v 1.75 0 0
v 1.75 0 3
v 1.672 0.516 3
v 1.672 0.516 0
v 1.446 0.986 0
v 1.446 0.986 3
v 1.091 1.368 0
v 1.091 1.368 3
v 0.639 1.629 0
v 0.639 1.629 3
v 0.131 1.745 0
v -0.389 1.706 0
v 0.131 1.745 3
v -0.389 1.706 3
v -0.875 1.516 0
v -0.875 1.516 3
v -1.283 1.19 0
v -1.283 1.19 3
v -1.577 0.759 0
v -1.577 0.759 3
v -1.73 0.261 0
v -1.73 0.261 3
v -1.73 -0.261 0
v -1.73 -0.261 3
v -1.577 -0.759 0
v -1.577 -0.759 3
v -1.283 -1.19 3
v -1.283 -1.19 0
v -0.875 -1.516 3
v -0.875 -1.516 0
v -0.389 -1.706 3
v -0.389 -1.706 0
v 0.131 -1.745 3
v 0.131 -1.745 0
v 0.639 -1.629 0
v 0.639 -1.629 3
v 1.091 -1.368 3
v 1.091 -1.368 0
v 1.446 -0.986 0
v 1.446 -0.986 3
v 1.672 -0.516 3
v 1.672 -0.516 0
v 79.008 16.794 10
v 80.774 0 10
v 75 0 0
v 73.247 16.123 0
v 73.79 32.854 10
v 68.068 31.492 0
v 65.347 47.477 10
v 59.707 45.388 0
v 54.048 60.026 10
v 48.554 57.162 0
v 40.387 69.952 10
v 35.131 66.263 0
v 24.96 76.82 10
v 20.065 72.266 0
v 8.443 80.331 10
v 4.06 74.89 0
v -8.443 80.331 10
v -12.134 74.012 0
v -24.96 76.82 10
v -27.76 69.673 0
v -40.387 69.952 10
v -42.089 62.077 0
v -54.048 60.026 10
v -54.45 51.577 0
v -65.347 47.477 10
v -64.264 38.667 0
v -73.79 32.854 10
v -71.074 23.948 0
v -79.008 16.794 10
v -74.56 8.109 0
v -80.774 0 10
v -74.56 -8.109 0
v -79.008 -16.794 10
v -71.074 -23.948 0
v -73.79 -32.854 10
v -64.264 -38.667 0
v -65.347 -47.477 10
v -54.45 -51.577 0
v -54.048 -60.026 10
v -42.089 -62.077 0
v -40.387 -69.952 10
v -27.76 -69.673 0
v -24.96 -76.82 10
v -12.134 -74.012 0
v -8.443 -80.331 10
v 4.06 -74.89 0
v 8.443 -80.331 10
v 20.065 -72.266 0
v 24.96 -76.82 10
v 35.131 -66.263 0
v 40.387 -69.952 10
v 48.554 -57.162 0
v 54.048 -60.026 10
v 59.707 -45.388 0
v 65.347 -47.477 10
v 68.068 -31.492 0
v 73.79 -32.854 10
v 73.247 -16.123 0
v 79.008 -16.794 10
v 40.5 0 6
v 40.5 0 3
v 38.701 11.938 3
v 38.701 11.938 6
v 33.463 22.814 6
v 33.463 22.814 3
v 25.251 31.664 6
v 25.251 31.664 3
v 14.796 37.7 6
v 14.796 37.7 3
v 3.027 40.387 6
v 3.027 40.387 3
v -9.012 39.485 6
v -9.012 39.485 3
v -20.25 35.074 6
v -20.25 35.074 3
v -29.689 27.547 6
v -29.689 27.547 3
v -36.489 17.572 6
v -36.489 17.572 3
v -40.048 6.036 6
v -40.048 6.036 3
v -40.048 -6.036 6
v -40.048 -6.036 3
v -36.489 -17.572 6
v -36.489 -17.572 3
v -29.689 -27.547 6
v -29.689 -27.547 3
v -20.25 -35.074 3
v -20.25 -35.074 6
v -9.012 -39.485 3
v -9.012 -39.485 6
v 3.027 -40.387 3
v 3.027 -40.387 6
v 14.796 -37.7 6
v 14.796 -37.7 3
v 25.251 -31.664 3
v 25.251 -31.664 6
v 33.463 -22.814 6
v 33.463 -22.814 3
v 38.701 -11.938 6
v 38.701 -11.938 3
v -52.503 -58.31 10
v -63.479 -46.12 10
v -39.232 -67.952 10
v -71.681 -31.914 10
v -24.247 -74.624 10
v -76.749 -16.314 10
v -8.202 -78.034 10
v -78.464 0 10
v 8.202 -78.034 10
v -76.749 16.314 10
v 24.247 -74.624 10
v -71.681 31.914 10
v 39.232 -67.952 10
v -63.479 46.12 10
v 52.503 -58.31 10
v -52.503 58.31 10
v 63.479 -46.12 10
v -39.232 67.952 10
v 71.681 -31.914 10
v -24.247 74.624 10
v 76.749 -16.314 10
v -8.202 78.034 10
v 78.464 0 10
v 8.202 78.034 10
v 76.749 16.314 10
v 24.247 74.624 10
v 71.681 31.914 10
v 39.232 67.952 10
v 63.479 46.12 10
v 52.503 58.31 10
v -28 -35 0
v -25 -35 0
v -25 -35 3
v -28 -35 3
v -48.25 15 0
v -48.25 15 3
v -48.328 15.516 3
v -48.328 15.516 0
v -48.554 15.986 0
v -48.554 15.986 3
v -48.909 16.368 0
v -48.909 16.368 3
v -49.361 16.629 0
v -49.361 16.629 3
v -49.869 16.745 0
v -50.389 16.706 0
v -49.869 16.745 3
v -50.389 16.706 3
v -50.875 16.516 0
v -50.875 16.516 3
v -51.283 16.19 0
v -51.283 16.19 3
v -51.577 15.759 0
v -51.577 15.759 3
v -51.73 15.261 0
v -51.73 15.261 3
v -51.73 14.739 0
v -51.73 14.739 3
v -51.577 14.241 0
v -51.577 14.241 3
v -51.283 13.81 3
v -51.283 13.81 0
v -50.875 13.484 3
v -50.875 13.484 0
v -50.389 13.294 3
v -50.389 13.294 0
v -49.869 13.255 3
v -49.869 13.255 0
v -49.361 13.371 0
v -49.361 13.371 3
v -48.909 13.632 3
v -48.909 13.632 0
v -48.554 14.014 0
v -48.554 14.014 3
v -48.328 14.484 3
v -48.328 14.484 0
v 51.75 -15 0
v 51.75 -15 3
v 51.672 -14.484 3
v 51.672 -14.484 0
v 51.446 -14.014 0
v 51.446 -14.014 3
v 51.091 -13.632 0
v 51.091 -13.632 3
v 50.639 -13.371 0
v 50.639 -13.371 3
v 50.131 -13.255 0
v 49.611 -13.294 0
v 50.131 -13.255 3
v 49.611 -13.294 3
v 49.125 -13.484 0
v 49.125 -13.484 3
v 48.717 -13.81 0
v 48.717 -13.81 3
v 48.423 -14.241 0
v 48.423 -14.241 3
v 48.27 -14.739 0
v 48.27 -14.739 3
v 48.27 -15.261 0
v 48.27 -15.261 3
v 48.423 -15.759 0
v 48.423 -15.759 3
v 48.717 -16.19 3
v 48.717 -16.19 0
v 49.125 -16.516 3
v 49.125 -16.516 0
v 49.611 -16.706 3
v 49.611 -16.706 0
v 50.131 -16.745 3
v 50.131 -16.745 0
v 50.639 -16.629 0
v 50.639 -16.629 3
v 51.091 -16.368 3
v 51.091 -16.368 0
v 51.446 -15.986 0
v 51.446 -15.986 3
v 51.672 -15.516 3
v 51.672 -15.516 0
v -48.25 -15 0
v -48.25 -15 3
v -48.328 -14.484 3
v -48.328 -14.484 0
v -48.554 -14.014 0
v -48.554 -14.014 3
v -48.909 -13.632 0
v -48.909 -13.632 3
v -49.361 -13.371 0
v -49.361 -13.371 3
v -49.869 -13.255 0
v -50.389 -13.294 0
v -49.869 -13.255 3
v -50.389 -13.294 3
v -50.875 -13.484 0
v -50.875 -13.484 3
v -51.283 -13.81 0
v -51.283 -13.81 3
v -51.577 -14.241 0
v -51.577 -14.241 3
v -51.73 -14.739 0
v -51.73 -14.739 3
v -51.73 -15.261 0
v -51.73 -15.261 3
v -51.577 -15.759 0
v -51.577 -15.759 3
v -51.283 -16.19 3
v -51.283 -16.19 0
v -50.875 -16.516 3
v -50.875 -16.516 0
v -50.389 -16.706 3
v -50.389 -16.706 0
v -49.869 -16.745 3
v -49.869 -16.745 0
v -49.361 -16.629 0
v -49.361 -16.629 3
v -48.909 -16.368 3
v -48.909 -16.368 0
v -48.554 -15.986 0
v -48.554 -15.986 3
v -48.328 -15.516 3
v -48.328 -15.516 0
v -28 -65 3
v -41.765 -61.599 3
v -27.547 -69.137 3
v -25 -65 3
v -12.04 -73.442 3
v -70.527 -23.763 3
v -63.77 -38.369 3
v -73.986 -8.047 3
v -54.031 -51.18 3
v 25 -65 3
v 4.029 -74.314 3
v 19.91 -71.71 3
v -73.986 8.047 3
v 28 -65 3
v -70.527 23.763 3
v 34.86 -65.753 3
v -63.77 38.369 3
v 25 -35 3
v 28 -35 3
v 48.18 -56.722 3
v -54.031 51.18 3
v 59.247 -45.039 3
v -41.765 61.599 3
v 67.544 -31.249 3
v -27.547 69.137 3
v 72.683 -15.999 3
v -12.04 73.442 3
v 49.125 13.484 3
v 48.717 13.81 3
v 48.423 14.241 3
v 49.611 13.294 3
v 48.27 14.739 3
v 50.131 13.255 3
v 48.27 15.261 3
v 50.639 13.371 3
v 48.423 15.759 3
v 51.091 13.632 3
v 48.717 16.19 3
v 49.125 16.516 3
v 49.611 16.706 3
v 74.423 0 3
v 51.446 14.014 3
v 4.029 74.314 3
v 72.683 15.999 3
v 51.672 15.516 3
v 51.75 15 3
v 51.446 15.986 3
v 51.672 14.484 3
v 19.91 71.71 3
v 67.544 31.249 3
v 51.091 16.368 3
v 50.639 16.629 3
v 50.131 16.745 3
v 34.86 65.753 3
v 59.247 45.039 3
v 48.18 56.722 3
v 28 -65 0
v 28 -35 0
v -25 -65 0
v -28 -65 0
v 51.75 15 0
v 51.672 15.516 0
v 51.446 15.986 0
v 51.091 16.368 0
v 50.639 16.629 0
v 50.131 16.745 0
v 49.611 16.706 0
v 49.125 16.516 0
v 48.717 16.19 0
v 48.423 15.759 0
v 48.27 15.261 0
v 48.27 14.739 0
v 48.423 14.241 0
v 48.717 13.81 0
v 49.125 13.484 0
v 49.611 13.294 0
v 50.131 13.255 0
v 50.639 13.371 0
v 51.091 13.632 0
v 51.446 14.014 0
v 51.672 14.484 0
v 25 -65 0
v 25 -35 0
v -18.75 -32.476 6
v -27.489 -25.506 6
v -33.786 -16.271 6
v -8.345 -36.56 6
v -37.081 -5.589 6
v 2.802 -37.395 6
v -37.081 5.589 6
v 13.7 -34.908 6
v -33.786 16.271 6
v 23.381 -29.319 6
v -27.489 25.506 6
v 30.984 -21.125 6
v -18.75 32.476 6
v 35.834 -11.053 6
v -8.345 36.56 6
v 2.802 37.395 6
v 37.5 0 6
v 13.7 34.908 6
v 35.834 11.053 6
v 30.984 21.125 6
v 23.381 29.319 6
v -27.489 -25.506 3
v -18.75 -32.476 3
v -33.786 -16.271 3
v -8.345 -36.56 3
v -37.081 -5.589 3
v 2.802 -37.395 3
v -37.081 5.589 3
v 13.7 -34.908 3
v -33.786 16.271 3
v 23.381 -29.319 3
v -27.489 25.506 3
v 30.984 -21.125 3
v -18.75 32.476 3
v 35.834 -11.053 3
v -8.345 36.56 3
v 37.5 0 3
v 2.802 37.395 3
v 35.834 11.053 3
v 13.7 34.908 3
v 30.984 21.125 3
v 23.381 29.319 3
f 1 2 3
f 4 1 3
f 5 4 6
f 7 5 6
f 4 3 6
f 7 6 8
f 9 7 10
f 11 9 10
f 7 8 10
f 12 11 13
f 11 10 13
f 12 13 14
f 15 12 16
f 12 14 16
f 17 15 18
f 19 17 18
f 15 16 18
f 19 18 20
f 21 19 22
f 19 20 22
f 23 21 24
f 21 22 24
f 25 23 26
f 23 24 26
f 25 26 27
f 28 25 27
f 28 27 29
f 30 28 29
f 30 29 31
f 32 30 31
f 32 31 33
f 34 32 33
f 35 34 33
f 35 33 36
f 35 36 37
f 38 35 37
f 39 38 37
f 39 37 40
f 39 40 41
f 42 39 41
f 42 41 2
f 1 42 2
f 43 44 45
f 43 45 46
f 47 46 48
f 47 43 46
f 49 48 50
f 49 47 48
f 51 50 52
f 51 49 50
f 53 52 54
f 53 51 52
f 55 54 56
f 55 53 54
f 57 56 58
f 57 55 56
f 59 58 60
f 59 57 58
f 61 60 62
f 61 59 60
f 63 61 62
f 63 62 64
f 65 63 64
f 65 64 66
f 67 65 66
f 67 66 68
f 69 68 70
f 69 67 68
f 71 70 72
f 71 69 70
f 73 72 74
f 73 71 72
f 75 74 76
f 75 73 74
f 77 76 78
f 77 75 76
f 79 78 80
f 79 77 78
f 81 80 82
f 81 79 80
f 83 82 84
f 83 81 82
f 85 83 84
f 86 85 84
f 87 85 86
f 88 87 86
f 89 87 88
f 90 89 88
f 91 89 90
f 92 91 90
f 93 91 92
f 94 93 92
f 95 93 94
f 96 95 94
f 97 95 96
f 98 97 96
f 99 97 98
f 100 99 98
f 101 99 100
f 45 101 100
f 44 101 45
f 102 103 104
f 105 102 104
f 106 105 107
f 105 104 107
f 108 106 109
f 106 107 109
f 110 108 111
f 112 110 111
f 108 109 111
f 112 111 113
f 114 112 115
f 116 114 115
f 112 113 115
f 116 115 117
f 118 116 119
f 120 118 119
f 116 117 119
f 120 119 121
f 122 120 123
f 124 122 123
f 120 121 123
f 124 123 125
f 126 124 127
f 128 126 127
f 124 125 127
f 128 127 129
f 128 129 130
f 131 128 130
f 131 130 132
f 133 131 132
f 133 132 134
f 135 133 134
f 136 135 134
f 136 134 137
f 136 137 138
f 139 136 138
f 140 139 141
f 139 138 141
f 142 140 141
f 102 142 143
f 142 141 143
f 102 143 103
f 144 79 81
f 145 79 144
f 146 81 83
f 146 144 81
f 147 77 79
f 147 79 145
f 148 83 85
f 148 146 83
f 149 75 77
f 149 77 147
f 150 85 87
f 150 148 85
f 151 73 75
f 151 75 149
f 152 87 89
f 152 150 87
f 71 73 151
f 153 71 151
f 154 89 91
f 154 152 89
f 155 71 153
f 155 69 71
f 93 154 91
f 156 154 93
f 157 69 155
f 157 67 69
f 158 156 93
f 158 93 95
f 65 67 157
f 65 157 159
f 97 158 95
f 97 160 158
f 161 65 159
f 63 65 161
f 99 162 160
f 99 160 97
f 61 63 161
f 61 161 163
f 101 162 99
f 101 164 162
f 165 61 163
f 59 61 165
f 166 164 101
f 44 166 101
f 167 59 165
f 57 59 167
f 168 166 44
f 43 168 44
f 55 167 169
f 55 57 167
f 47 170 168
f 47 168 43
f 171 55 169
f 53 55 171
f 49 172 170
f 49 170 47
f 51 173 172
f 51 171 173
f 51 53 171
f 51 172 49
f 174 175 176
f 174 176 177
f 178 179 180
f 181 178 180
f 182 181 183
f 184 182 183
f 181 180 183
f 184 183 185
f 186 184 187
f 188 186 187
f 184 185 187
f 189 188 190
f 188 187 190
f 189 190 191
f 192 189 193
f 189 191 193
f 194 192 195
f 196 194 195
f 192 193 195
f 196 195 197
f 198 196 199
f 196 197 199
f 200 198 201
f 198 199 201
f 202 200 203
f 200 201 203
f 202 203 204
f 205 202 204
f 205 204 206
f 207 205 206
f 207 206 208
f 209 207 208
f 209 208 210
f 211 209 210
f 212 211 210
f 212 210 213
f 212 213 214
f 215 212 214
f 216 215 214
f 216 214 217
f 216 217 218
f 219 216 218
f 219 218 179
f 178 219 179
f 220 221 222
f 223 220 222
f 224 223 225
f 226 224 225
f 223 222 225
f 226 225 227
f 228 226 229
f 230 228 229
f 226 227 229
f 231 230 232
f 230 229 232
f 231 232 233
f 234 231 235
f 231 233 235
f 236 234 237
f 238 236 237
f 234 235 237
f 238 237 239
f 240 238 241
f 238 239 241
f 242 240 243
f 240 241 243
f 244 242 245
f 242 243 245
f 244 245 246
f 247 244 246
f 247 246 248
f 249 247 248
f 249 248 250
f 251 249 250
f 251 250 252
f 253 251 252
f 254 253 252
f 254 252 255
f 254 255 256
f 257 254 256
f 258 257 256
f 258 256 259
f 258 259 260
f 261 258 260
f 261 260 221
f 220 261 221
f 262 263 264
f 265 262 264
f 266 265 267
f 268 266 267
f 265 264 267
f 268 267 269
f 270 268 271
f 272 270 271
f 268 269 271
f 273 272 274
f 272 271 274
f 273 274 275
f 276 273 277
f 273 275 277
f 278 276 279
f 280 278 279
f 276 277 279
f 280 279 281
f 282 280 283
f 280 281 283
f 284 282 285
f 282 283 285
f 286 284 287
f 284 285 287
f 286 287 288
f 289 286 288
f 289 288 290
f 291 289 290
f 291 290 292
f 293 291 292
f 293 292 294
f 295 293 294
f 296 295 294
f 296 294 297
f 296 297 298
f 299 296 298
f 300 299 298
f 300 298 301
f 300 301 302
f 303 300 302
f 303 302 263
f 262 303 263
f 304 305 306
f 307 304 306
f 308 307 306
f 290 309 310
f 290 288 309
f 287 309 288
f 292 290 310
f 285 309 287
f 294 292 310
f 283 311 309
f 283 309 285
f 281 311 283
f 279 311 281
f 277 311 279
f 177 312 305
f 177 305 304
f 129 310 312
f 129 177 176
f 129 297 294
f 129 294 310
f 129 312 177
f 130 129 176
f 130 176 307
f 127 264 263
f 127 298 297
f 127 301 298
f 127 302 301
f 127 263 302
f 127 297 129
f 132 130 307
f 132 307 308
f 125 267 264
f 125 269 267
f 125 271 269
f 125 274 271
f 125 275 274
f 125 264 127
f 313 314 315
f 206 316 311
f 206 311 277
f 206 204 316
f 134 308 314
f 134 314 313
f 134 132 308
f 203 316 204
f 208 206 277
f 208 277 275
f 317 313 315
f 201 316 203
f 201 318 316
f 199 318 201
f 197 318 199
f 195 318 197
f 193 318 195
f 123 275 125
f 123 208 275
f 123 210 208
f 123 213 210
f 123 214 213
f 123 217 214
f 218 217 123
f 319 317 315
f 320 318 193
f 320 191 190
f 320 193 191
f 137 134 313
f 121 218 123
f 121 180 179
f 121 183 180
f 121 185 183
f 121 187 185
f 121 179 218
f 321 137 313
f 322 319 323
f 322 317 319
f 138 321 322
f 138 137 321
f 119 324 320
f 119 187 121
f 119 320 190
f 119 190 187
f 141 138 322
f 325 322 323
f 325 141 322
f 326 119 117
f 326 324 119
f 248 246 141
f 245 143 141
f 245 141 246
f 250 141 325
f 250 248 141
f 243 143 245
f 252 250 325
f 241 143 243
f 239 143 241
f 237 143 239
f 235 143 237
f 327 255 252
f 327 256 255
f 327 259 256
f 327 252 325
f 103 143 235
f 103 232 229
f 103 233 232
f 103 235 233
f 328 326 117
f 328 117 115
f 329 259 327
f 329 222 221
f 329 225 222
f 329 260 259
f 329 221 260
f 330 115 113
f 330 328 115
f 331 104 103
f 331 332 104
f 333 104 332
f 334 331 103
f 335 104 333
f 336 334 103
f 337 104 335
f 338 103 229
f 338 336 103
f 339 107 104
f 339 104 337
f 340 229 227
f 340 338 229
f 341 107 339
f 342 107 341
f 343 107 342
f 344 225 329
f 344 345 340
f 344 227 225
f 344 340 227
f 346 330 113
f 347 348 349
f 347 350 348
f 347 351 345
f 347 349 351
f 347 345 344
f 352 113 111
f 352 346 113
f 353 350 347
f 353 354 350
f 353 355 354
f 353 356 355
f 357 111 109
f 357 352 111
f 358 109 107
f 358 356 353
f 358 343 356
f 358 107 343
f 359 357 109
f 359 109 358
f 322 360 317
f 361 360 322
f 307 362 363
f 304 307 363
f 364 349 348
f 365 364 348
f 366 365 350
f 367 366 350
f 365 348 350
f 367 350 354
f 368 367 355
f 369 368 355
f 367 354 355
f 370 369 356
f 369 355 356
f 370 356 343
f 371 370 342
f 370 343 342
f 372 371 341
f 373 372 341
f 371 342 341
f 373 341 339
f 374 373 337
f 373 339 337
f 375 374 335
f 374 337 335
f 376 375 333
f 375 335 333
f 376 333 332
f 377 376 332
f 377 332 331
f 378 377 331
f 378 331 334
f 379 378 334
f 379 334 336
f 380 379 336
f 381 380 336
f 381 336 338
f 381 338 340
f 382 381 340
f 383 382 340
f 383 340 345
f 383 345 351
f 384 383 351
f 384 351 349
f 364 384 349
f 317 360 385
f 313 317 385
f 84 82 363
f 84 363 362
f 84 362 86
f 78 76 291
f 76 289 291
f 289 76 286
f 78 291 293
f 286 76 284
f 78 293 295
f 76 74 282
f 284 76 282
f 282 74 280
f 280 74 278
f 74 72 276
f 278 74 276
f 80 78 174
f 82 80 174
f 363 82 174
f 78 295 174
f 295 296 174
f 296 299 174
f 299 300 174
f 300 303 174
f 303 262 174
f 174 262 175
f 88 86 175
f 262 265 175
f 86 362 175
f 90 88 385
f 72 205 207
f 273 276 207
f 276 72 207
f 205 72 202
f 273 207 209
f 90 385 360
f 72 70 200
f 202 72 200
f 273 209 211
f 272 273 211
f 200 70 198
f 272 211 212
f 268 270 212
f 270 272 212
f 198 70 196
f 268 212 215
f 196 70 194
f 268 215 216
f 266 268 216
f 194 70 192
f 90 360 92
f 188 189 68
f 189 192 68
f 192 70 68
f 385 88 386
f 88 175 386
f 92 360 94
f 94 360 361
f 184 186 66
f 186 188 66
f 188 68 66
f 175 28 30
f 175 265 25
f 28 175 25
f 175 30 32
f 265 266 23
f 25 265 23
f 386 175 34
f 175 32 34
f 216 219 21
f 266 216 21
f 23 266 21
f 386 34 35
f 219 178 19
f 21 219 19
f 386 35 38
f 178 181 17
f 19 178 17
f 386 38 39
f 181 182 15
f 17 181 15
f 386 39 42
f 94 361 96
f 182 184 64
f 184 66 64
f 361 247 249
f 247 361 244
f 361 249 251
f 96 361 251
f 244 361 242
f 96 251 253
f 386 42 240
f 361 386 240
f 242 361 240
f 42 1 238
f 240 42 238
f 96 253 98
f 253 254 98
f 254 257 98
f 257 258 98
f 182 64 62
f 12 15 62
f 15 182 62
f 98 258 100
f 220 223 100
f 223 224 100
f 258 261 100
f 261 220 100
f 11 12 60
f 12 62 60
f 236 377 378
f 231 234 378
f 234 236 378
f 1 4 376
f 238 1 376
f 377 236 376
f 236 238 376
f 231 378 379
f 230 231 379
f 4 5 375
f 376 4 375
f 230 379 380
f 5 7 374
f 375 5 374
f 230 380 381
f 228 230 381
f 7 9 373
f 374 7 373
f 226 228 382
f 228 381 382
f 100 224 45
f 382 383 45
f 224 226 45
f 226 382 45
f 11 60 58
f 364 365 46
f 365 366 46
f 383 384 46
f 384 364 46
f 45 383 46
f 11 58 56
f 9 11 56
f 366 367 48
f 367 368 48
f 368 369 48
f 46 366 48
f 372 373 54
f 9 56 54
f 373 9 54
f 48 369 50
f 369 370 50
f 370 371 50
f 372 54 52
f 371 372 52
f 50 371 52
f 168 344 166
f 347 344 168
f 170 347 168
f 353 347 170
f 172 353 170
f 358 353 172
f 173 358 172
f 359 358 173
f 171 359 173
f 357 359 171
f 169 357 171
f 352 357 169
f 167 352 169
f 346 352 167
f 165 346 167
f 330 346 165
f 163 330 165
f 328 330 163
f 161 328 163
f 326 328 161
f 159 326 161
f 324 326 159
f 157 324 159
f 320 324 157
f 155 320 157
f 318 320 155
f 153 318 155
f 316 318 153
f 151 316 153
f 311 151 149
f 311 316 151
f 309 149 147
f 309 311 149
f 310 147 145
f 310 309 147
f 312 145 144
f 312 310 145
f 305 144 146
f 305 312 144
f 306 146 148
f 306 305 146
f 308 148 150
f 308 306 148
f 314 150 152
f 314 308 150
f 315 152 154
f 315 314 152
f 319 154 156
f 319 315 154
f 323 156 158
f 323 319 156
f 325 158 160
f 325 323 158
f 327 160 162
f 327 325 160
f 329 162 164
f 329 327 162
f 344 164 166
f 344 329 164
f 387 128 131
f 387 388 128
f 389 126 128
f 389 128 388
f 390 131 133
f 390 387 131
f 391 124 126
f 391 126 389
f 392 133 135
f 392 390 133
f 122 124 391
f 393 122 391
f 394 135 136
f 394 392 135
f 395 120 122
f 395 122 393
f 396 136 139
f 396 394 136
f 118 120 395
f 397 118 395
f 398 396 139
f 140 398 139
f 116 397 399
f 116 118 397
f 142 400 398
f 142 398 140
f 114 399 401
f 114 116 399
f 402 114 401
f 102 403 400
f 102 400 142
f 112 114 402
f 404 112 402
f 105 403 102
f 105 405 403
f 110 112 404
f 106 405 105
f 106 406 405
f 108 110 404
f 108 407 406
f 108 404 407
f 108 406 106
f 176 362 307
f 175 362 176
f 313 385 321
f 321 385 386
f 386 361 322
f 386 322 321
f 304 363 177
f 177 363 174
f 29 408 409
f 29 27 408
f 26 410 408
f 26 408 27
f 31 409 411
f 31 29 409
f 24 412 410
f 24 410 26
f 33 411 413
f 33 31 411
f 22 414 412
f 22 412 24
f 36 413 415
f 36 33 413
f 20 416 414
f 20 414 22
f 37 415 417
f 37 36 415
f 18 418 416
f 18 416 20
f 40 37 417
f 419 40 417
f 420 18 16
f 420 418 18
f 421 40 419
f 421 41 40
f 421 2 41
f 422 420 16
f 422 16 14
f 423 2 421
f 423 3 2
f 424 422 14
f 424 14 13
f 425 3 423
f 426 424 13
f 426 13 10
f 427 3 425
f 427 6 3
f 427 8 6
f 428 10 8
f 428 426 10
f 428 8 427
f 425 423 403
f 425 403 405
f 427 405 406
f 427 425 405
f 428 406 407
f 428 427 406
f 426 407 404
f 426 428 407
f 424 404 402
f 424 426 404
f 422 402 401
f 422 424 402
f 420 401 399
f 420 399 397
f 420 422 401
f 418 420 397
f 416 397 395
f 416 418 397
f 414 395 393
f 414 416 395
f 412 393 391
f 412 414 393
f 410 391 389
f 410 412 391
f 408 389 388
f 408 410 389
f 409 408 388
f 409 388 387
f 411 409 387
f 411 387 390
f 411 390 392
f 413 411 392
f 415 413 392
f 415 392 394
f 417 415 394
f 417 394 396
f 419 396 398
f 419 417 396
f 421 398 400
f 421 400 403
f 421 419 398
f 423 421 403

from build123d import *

# Parameters (mm, degrees)
SKETCH1_R           = 75
BOSS_EXTRUDE1_DEPTH = 3
SKETCH2_R           = 1.75
CUT_EXTRUDE1_DEPTH  = 107.108435103
SKETCH3_R           = 40.5
SKETCH3_R_2         = 37.5
BOSS_EXTRUDE2_DEPTH = 3
SKETCH4_W           = 3
SKETCH4_H           = 30
CUT_EXTRUDE2_DEPTH  = 107.235587258


with BuildPart() as part:
    # Sketch1 → Boss-Extrude1 (new body)
    with BuildSketch(Plane.XY):
        Circle(SKETCH1_R)
    extrude(amount=BOSS_EXTRUDE1_DEPTH)

    # Sketch2 → Cut-Extrude1 (cut, through all)
    with BuildSketch(Plane.XY.offset(3)):
        with Locations((-50, 15)):
            Circle(SKETCH2_R)
        with Locations((-50, -15)):
            Circle(SKETCH2_R)
        with Locations((50, -15)):
            Circle(SKETCH2_R)
        with Locations((50, 15)):
            Circle(SKETCH2_R)
        Circle(SKETCH2_R)
    extrude(amount=-CUT_EXTRUDE1_DEPTH, mode=Mode.SUBTRACT)

    # Sketch3 → Boss-Extrude2 (add)
    with BuildSketch(Plane.XY.offset(3)):
        Circle(SKETCH3_R)
        Circle(SKETCH3_R_2, mode=Mode.SUBTRACT)
    extrude(amount=BOSS_EXTRUDE2_DEPTH)

    # Sketch4 → Cut-Extrude2 (cut, through all)
    with BuildSketch(Plane(origin=(0, 0, 0), x_dir=(-1, 0, 0), z_dir=(0, 0, -1))):
        with Locations((-26.5, -50)):
            Rectangle(SKETCH4_W, SKETCH4_H)
        with Locations((26.5, -50)):
            Rectangle(SKETCH4_W, SKETCH4_H)
    extrude(amount=-CUT_EXTRUDE2_DEPTH, mode=Mode.SUBTRACT)

    # Sketch5 → Revolve1 (revolve)
    with BuildSketch(Plane(origin=(0, 0, 0), x_dir=(1, 0, 0), z_dir=(0, 1, 0)), mode=Mode.PRIVATE) as revolve1_sk:
        Polygon((-75, 0), (-80.773502692, -10), (-78.464101615, -10), (-72.690598923, 0), align=None)
    revolve(revolve1_sk.sketch.rotate(Axis((0, 0, 0), (0, 0, 1)), 180), axis=Axis((0, 0, 0), (0, 0, 1)))


solid = part.part
